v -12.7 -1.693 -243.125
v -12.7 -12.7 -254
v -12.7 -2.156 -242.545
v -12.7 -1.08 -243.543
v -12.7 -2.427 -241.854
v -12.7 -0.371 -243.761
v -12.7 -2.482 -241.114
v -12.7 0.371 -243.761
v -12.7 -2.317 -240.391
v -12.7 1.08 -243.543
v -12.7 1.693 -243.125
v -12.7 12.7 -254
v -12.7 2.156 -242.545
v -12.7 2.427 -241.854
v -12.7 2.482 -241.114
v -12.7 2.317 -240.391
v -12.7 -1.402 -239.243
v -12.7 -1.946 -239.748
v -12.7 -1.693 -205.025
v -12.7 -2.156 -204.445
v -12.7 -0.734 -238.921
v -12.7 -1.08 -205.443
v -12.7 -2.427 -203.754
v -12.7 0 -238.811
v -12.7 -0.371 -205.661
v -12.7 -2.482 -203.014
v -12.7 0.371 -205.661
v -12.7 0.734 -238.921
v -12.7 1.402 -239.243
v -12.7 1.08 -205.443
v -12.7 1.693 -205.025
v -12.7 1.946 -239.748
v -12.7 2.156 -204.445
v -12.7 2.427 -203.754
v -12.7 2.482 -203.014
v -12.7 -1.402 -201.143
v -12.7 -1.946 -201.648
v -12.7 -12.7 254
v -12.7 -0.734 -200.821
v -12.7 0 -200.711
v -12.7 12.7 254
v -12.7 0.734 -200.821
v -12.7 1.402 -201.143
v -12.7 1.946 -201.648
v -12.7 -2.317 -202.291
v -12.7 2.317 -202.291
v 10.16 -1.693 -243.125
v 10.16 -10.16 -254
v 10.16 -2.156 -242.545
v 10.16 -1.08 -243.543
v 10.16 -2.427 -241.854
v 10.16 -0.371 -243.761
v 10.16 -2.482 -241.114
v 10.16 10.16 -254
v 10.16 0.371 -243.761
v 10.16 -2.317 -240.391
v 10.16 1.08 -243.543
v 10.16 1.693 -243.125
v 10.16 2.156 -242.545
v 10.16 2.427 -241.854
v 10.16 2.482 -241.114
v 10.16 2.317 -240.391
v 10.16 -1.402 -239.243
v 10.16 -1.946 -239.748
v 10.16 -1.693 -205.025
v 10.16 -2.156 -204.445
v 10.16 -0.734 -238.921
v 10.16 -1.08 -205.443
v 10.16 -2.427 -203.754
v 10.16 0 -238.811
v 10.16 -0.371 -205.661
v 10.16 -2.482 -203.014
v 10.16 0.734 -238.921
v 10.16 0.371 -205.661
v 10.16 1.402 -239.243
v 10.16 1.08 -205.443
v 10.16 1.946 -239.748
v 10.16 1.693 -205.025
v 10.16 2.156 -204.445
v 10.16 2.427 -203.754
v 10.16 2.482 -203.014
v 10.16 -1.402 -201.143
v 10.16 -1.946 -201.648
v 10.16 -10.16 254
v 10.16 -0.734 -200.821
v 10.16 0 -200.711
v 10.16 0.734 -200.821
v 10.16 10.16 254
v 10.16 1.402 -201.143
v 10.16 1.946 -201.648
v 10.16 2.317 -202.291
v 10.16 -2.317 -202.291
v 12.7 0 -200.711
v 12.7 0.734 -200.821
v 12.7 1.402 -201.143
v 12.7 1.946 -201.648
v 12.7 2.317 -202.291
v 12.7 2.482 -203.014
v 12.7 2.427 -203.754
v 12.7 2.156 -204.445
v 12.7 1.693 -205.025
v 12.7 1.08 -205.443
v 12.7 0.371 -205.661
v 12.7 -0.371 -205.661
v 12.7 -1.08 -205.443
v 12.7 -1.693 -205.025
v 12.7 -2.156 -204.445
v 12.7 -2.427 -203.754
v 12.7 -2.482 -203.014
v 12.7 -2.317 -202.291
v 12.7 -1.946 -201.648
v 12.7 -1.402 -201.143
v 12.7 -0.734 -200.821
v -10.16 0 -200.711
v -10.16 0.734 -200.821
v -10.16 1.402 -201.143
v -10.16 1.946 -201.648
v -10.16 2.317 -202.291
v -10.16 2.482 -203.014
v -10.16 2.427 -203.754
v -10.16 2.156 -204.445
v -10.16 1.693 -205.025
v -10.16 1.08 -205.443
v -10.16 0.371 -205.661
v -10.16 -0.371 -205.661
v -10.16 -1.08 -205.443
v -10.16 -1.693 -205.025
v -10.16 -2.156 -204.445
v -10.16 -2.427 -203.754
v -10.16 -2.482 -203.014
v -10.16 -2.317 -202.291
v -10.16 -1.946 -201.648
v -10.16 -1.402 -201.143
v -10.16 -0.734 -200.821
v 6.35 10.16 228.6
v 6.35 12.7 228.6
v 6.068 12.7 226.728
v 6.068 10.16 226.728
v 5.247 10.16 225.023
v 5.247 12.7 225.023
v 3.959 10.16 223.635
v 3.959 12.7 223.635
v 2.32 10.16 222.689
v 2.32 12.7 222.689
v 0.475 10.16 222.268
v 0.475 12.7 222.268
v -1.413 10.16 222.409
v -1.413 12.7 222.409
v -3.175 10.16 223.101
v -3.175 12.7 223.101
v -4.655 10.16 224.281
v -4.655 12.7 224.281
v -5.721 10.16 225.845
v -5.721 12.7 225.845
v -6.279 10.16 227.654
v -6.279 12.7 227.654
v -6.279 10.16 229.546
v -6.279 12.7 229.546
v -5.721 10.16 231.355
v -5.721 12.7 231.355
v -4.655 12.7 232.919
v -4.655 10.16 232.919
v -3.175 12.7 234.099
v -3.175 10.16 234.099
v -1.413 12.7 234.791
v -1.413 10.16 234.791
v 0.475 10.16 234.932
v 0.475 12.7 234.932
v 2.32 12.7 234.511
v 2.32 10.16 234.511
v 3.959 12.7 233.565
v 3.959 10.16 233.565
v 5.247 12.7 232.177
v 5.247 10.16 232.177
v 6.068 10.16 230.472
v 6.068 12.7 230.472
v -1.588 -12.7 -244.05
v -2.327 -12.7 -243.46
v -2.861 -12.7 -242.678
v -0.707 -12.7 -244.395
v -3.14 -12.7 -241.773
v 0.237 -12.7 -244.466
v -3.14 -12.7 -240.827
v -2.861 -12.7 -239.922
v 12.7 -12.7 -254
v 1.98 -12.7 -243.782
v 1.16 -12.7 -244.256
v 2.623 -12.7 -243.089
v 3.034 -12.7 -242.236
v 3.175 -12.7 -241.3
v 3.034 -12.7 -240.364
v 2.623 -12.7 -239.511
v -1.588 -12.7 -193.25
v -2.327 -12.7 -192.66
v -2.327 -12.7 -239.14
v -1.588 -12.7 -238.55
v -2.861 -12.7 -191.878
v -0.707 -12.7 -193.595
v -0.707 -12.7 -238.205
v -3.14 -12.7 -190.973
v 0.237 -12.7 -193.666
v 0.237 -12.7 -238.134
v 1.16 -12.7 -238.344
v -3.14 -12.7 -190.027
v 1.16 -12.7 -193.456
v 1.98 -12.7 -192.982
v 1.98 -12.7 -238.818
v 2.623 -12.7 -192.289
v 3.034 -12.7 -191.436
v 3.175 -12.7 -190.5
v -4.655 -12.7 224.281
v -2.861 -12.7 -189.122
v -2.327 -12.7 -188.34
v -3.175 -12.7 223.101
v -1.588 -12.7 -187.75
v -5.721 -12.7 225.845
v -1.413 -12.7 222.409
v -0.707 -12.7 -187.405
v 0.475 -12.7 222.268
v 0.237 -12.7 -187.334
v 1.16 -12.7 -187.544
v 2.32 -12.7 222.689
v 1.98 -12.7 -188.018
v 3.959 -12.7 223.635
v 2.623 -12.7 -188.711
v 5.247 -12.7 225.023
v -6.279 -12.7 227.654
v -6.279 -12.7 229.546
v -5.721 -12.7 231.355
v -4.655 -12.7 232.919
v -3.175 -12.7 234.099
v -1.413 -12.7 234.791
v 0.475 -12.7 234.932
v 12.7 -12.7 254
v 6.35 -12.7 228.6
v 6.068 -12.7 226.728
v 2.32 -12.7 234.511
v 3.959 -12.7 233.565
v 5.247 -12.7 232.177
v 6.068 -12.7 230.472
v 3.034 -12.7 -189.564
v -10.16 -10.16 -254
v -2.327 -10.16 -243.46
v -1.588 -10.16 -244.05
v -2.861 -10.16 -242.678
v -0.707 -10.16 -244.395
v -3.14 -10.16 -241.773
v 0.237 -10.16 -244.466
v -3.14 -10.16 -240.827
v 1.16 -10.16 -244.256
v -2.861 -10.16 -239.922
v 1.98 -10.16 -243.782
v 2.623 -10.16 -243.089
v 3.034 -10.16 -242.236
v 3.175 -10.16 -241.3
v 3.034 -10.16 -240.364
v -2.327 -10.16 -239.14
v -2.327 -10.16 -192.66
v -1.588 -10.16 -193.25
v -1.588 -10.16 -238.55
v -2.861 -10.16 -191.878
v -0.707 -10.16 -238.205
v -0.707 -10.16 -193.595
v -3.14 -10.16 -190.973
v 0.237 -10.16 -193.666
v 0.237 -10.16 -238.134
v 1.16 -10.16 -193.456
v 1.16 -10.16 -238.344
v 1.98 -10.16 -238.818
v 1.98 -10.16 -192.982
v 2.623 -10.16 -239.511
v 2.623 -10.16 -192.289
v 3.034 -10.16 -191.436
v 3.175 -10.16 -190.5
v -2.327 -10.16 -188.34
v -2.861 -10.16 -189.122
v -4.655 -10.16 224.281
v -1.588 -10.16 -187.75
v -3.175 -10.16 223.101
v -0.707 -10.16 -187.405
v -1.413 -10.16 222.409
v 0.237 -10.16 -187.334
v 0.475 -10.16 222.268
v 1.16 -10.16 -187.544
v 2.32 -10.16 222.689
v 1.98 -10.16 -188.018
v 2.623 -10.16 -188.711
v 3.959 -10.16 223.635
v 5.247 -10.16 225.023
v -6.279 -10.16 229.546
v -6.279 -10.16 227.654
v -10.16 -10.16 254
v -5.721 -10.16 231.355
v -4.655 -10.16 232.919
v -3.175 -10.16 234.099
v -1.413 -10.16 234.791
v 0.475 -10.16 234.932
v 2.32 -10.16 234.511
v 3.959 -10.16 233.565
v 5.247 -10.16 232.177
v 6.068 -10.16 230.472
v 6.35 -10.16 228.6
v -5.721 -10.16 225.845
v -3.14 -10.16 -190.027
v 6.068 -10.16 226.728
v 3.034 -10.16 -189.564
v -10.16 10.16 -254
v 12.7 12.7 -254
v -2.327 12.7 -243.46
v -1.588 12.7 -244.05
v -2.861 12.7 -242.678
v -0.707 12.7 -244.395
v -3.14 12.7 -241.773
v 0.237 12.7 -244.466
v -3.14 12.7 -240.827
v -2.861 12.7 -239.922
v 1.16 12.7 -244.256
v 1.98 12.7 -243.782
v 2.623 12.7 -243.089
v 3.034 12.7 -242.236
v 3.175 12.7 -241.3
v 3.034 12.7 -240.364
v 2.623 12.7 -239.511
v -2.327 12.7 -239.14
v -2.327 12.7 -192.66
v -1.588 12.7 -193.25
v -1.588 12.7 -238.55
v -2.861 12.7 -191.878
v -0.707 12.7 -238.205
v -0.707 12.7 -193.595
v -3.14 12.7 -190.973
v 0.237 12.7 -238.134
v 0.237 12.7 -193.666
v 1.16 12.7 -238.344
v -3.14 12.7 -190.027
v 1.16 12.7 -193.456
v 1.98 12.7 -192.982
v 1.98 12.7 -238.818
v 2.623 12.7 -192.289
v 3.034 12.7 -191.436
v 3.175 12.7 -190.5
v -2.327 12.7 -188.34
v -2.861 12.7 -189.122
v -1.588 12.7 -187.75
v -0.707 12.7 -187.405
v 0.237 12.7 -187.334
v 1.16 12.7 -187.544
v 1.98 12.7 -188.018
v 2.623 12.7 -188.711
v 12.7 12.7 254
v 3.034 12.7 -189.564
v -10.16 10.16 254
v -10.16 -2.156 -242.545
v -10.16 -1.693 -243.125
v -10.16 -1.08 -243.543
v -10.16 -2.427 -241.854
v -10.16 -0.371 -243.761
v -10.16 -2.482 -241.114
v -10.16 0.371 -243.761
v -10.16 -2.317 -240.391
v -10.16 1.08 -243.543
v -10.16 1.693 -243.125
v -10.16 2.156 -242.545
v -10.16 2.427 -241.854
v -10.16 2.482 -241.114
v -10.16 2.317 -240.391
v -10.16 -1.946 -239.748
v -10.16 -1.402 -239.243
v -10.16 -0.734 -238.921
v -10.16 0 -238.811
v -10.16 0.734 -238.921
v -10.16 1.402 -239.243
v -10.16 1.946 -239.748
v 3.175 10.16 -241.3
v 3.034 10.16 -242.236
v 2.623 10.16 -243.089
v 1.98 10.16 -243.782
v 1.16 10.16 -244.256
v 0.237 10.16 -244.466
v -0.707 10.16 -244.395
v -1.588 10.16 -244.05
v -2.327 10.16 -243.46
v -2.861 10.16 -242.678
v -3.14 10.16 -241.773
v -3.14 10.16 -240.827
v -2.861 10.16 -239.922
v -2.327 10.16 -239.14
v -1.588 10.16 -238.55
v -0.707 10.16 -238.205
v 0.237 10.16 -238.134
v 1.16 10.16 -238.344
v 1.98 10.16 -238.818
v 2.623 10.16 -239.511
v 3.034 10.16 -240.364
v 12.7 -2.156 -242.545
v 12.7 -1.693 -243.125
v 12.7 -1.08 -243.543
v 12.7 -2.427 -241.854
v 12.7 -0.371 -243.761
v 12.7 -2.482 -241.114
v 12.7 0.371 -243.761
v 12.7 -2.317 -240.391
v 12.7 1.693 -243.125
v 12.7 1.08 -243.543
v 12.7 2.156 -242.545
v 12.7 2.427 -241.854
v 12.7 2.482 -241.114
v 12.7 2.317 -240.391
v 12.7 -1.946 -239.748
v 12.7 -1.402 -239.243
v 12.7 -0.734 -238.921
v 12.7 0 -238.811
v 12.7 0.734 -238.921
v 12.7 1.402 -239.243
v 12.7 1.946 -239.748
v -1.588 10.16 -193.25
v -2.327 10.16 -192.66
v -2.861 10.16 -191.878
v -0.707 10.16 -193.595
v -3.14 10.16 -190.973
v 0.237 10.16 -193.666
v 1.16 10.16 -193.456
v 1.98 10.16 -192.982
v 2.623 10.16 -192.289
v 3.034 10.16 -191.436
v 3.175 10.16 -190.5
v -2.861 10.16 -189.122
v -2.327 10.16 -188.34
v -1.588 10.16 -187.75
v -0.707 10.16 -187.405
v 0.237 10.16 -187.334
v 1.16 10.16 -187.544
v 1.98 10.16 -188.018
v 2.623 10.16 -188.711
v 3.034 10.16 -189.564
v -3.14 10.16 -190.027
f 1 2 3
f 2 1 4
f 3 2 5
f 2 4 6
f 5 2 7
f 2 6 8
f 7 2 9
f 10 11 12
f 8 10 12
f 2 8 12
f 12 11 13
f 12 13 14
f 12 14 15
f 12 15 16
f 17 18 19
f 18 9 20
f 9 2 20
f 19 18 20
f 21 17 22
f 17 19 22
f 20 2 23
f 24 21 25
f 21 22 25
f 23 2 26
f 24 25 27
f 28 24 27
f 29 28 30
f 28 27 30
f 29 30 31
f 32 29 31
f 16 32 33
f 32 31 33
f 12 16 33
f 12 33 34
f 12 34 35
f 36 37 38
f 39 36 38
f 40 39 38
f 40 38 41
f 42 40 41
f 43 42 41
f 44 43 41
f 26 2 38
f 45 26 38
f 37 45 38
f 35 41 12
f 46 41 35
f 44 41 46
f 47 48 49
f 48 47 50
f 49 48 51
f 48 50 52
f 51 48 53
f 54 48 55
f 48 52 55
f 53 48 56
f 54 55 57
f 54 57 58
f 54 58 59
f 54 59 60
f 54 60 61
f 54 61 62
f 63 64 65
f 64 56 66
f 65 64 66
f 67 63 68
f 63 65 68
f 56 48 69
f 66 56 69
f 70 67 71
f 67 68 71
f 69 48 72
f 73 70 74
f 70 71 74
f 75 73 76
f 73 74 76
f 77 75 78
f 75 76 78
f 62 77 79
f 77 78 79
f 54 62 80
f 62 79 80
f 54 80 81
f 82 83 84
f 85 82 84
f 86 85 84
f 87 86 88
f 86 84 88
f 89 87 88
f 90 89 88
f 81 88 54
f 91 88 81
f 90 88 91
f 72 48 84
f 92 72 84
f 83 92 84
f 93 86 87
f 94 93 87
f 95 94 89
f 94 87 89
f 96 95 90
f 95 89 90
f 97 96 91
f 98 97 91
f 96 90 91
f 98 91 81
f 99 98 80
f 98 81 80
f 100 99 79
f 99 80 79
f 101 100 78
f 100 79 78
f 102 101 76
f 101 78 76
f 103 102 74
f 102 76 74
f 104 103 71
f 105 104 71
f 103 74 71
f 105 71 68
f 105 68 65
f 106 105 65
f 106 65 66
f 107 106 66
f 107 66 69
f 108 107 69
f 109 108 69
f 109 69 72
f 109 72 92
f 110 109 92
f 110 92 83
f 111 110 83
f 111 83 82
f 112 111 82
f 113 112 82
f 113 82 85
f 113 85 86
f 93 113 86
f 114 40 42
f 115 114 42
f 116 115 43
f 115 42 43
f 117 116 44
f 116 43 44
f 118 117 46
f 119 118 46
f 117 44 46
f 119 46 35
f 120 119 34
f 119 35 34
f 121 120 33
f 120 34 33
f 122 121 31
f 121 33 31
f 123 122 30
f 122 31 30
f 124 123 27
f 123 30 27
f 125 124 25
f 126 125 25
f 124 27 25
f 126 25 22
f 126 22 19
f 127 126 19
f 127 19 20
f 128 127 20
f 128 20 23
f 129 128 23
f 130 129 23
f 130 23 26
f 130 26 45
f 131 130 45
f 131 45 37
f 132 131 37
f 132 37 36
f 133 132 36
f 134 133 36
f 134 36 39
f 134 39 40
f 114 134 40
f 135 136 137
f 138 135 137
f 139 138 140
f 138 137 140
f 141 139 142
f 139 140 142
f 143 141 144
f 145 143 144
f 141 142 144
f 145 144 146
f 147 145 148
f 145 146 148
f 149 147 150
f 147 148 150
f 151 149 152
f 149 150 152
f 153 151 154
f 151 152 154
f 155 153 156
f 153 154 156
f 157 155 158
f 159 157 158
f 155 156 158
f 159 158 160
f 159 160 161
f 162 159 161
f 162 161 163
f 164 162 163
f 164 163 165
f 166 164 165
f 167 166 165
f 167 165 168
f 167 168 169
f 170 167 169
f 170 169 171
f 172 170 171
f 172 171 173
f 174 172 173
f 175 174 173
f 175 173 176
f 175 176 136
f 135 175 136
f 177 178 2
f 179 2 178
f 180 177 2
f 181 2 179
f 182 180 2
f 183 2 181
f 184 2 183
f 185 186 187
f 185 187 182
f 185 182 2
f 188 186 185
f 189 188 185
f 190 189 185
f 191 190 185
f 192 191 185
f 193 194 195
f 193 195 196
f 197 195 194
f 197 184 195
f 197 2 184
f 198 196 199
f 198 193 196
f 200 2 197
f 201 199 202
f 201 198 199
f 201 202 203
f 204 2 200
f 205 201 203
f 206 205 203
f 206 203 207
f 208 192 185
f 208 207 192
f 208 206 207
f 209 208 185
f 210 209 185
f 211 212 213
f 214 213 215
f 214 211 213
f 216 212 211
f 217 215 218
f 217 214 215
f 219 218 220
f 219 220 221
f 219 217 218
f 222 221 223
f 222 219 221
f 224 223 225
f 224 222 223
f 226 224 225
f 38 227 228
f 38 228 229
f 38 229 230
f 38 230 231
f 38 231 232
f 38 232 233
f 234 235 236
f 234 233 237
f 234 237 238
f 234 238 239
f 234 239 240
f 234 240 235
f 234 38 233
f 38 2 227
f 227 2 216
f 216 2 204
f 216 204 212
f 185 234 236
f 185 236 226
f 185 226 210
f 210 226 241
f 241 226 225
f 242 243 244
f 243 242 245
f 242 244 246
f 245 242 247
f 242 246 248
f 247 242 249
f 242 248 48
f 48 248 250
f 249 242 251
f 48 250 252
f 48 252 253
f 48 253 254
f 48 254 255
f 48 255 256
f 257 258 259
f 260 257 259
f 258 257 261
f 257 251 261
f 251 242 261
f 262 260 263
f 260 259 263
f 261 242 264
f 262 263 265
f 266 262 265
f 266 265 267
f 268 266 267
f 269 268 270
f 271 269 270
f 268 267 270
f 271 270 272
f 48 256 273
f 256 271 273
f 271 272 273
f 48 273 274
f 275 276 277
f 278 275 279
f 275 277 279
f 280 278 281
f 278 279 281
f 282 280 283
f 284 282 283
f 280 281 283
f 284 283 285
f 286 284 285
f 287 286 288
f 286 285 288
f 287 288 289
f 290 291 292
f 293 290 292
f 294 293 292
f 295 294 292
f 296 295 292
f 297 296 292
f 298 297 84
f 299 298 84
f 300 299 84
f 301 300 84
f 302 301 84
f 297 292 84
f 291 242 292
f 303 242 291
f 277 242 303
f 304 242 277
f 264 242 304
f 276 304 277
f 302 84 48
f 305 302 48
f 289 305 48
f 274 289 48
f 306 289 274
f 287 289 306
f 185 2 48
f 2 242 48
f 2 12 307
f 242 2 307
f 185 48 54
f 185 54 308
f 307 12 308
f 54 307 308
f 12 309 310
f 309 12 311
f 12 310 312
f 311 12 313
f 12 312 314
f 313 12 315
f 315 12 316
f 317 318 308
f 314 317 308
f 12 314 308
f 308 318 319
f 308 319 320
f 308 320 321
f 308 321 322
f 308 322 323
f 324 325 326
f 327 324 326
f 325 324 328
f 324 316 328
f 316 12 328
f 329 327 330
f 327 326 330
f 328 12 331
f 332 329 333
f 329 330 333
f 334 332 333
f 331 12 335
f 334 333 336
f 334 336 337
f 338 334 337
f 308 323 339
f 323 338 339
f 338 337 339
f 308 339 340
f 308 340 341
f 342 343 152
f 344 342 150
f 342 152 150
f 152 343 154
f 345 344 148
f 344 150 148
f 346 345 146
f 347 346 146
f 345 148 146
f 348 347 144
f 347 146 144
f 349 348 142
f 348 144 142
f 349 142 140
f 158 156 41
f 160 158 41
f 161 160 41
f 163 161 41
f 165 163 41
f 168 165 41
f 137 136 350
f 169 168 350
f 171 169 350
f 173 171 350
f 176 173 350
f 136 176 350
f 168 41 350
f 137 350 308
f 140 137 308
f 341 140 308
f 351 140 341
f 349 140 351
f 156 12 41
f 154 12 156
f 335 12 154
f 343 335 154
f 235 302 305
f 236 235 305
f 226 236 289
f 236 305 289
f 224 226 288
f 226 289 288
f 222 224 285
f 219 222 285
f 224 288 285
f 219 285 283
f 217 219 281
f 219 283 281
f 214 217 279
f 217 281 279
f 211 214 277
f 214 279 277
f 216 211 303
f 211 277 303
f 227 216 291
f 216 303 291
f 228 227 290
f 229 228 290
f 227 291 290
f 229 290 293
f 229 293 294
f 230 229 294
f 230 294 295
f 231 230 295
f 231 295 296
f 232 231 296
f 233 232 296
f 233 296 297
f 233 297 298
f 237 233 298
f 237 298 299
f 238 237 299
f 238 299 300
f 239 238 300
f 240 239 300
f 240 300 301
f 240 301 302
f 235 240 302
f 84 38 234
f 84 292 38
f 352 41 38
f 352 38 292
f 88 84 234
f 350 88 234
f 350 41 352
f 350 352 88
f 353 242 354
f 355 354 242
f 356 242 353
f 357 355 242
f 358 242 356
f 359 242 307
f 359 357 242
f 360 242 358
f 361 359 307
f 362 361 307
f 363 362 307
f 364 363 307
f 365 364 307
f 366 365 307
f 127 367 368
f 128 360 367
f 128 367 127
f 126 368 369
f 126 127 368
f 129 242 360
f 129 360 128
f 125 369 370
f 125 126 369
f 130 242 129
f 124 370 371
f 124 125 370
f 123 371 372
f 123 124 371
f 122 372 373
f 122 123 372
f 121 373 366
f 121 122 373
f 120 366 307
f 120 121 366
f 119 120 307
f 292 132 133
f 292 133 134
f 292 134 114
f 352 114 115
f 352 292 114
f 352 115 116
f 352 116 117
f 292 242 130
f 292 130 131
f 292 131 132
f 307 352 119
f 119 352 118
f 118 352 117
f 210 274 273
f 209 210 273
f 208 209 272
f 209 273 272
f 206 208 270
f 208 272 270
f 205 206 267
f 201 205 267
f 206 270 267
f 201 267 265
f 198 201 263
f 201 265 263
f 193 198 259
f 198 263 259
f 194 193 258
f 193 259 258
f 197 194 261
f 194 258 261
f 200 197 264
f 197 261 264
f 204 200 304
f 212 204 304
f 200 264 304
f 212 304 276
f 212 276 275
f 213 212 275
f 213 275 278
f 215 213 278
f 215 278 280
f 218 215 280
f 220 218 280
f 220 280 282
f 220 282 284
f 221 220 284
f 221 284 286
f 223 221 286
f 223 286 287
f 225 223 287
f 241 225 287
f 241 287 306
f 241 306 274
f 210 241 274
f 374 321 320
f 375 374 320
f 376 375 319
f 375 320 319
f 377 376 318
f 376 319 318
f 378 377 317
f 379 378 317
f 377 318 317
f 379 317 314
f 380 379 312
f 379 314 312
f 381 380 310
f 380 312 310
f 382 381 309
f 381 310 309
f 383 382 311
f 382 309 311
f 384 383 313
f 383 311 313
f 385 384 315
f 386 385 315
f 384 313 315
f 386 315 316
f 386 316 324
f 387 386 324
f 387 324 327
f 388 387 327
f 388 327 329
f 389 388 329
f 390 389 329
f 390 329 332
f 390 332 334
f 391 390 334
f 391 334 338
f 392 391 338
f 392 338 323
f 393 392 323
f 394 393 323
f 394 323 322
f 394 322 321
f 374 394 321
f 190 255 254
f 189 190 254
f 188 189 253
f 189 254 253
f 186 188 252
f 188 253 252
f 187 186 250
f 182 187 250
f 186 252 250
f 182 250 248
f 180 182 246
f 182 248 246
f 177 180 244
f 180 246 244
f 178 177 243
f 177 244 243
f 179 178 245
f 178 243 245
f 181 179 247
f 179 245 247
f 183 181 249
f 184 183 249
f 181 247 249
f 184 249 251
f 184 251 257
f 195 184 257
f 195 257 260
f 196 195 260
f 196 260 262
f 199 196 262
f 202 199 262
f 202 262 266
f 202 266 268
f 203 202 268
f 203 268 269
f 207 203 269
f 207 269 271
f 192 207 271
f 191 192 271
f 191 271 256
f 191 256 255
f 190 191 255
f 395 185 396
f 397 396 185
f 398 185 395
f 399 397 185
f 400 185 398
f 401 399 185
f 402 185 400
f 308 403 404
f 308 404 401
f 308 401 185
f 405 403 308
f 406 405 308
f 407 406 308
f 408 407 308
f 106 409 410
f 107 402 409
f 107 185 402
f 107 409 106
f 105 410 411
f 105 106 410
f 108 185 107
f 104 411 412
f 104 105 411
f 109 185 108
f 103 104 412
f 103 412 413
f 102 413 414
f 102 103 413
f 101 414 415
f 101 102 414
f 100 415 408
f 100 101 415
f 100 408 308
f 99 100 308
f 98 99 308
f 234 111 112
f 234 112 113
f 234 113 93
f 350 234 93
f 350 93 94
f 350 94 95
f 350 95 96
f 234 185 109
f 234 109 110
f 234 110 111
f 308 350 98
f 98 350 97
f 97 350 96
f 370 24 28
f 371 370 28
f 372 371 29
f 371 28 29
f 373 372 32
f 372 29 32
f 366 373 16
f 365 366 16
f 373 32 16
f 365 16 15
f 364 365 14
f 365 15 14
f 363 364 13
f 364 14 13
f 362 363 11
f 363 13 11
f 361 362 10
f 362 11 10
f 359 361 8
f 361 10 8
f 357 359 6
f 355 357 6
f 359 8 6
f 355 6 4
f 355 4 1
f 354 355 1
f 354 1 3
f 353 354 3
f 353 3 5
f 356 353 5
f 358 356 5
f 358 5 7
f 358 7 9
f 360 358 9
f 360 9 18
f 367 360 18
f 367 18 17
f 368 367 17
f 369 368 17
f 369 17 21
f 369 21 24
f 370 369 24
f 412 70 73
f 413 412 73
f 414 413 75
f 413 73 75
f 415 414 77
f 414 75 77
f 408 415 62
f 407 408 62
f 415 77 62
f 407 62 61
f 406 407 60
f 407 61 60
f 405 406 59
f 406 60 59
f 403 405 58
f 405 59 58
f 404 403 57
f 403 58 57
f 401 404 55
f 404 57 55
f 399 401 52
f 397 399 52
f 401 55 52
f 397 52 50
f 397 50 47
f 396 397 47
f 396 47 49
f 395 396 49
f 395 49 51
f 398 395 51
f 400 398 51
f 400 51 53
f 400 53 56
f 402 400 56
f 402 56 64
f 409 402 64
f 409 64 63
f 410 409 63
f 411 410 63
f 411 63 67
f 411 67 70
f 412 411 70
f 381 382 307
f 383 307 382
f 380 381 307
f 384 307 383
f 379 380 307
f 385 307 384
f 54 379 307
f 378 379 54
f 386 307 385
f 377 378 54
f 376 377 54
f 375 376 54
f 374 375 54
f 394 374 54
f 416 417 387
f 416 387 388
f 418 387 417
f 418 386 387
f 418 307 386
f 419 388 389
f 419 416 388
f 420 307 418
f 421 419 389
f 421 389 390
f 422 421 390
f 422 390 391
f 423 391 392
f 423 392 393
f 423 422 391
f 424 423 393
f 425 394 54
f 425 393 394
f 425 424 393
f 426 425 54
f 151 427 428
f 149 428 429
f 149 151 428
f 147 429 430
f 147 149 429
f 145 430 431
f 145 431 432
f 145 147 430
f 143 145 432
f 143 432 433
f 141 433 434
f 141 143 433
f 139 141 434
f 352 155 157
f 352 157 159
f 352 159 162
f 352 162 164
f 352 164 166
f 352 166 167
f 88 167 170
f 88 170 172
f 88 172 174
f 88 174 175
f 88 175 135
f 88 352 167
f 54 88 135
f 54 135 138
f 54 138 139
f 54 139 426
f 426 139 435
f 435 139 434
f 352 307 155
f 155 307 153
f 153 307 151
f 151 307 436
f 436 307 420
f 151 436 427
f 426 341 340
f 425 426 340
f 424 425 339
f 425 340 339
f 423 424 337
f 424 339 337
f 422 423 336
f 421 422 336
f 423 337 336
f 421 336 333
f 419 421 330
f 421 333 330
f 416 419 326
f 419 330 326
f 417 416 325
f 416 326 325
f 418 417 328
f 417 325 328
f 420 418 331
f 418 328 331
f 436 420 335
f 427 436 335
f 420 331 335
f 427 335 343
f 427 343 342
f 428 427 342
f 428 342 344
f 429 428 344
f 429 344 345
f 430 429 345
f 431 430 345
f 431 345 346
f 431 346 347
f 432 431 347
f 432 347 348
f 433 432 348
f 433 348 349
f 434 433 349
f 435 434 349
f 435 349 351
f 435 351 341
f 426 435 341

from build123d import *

# Parameters (mm, degrees)
SKETCH1_W           = 25.4
SKETCH1_H           = 25.4
SKETCH1_W_2         = 20.32
SKETCH1_H_2         = 20.32
EXTRUDE_THIN1_DEPTH = 254
SKETCH2_R           = 3.175
CUT_EXTRUDE1_DEPTH  = 26.4
SKETCH3_R           = 6.35
CUT_EXTRUDE2_DEPTH  = 26.4
SKETCH4_R           = 2.4892
CUT_EXTRUDE3_DEPTH  = 26.4


with BuildPart() as part:
    # Sketch1 → Extrude-Thin1 (new body, symmetric)
    with BuildSketch(Plane.XY):
        Rectangle(SKETCH1_W, SKETCH1_H)
        Rectangle(SKETCH1_W_2, SKETCH1_H_2, mode=Mode.SUBTRACT)
    extrude(amount=EXTRUDE_THIN1_DEPTH, both=True)

    # Sketch2 → Cut-Extrude1 (cut, through all)
    with BuildSketch(Plane(origin=(0, 12.7, 0), x_dir=(1, 0, 0), z_dir=(0, 1, 0))):
        with Locations((0, 241.3)):
            Circle(SKETCH2_R)
        with Locations((0, 190.5)):
            Circle(SKETCH2_R)
    extrude(amount=-CUT_EXTRUDE1_DEPTH, mode=Mode.SUBTRACT)

    # Sketch3 → Cut-Extrude2 (cut, through all)
    with BuildSketch(Plane(origin=(0, 12.7, 0), x_dir=(1, 0, 0), z_dir=(0, 1, 0))):
        with Locations((0, -228.6)):
            Circle(SKETCH3_R)
    extrude(amount=-CUT_EXTRUDE2_DEPTH, mode=Mode.SUBTRACT)

    # Sketch4 → Cut-Extrude3 (cut, through all)
    with BuildSketch(Plane.ZY.offset(12.7)):
        with Locations((-241.3, 0)):
            Circle(SKETCH4_R)
        with Locations((-203.2, 0)):
            Circle(SKETCH4_R)
    extrude(amount=-CUT_EXTRUDE3_DEPTH, mode=Mode.SUBTRACT)


solid = part.part
